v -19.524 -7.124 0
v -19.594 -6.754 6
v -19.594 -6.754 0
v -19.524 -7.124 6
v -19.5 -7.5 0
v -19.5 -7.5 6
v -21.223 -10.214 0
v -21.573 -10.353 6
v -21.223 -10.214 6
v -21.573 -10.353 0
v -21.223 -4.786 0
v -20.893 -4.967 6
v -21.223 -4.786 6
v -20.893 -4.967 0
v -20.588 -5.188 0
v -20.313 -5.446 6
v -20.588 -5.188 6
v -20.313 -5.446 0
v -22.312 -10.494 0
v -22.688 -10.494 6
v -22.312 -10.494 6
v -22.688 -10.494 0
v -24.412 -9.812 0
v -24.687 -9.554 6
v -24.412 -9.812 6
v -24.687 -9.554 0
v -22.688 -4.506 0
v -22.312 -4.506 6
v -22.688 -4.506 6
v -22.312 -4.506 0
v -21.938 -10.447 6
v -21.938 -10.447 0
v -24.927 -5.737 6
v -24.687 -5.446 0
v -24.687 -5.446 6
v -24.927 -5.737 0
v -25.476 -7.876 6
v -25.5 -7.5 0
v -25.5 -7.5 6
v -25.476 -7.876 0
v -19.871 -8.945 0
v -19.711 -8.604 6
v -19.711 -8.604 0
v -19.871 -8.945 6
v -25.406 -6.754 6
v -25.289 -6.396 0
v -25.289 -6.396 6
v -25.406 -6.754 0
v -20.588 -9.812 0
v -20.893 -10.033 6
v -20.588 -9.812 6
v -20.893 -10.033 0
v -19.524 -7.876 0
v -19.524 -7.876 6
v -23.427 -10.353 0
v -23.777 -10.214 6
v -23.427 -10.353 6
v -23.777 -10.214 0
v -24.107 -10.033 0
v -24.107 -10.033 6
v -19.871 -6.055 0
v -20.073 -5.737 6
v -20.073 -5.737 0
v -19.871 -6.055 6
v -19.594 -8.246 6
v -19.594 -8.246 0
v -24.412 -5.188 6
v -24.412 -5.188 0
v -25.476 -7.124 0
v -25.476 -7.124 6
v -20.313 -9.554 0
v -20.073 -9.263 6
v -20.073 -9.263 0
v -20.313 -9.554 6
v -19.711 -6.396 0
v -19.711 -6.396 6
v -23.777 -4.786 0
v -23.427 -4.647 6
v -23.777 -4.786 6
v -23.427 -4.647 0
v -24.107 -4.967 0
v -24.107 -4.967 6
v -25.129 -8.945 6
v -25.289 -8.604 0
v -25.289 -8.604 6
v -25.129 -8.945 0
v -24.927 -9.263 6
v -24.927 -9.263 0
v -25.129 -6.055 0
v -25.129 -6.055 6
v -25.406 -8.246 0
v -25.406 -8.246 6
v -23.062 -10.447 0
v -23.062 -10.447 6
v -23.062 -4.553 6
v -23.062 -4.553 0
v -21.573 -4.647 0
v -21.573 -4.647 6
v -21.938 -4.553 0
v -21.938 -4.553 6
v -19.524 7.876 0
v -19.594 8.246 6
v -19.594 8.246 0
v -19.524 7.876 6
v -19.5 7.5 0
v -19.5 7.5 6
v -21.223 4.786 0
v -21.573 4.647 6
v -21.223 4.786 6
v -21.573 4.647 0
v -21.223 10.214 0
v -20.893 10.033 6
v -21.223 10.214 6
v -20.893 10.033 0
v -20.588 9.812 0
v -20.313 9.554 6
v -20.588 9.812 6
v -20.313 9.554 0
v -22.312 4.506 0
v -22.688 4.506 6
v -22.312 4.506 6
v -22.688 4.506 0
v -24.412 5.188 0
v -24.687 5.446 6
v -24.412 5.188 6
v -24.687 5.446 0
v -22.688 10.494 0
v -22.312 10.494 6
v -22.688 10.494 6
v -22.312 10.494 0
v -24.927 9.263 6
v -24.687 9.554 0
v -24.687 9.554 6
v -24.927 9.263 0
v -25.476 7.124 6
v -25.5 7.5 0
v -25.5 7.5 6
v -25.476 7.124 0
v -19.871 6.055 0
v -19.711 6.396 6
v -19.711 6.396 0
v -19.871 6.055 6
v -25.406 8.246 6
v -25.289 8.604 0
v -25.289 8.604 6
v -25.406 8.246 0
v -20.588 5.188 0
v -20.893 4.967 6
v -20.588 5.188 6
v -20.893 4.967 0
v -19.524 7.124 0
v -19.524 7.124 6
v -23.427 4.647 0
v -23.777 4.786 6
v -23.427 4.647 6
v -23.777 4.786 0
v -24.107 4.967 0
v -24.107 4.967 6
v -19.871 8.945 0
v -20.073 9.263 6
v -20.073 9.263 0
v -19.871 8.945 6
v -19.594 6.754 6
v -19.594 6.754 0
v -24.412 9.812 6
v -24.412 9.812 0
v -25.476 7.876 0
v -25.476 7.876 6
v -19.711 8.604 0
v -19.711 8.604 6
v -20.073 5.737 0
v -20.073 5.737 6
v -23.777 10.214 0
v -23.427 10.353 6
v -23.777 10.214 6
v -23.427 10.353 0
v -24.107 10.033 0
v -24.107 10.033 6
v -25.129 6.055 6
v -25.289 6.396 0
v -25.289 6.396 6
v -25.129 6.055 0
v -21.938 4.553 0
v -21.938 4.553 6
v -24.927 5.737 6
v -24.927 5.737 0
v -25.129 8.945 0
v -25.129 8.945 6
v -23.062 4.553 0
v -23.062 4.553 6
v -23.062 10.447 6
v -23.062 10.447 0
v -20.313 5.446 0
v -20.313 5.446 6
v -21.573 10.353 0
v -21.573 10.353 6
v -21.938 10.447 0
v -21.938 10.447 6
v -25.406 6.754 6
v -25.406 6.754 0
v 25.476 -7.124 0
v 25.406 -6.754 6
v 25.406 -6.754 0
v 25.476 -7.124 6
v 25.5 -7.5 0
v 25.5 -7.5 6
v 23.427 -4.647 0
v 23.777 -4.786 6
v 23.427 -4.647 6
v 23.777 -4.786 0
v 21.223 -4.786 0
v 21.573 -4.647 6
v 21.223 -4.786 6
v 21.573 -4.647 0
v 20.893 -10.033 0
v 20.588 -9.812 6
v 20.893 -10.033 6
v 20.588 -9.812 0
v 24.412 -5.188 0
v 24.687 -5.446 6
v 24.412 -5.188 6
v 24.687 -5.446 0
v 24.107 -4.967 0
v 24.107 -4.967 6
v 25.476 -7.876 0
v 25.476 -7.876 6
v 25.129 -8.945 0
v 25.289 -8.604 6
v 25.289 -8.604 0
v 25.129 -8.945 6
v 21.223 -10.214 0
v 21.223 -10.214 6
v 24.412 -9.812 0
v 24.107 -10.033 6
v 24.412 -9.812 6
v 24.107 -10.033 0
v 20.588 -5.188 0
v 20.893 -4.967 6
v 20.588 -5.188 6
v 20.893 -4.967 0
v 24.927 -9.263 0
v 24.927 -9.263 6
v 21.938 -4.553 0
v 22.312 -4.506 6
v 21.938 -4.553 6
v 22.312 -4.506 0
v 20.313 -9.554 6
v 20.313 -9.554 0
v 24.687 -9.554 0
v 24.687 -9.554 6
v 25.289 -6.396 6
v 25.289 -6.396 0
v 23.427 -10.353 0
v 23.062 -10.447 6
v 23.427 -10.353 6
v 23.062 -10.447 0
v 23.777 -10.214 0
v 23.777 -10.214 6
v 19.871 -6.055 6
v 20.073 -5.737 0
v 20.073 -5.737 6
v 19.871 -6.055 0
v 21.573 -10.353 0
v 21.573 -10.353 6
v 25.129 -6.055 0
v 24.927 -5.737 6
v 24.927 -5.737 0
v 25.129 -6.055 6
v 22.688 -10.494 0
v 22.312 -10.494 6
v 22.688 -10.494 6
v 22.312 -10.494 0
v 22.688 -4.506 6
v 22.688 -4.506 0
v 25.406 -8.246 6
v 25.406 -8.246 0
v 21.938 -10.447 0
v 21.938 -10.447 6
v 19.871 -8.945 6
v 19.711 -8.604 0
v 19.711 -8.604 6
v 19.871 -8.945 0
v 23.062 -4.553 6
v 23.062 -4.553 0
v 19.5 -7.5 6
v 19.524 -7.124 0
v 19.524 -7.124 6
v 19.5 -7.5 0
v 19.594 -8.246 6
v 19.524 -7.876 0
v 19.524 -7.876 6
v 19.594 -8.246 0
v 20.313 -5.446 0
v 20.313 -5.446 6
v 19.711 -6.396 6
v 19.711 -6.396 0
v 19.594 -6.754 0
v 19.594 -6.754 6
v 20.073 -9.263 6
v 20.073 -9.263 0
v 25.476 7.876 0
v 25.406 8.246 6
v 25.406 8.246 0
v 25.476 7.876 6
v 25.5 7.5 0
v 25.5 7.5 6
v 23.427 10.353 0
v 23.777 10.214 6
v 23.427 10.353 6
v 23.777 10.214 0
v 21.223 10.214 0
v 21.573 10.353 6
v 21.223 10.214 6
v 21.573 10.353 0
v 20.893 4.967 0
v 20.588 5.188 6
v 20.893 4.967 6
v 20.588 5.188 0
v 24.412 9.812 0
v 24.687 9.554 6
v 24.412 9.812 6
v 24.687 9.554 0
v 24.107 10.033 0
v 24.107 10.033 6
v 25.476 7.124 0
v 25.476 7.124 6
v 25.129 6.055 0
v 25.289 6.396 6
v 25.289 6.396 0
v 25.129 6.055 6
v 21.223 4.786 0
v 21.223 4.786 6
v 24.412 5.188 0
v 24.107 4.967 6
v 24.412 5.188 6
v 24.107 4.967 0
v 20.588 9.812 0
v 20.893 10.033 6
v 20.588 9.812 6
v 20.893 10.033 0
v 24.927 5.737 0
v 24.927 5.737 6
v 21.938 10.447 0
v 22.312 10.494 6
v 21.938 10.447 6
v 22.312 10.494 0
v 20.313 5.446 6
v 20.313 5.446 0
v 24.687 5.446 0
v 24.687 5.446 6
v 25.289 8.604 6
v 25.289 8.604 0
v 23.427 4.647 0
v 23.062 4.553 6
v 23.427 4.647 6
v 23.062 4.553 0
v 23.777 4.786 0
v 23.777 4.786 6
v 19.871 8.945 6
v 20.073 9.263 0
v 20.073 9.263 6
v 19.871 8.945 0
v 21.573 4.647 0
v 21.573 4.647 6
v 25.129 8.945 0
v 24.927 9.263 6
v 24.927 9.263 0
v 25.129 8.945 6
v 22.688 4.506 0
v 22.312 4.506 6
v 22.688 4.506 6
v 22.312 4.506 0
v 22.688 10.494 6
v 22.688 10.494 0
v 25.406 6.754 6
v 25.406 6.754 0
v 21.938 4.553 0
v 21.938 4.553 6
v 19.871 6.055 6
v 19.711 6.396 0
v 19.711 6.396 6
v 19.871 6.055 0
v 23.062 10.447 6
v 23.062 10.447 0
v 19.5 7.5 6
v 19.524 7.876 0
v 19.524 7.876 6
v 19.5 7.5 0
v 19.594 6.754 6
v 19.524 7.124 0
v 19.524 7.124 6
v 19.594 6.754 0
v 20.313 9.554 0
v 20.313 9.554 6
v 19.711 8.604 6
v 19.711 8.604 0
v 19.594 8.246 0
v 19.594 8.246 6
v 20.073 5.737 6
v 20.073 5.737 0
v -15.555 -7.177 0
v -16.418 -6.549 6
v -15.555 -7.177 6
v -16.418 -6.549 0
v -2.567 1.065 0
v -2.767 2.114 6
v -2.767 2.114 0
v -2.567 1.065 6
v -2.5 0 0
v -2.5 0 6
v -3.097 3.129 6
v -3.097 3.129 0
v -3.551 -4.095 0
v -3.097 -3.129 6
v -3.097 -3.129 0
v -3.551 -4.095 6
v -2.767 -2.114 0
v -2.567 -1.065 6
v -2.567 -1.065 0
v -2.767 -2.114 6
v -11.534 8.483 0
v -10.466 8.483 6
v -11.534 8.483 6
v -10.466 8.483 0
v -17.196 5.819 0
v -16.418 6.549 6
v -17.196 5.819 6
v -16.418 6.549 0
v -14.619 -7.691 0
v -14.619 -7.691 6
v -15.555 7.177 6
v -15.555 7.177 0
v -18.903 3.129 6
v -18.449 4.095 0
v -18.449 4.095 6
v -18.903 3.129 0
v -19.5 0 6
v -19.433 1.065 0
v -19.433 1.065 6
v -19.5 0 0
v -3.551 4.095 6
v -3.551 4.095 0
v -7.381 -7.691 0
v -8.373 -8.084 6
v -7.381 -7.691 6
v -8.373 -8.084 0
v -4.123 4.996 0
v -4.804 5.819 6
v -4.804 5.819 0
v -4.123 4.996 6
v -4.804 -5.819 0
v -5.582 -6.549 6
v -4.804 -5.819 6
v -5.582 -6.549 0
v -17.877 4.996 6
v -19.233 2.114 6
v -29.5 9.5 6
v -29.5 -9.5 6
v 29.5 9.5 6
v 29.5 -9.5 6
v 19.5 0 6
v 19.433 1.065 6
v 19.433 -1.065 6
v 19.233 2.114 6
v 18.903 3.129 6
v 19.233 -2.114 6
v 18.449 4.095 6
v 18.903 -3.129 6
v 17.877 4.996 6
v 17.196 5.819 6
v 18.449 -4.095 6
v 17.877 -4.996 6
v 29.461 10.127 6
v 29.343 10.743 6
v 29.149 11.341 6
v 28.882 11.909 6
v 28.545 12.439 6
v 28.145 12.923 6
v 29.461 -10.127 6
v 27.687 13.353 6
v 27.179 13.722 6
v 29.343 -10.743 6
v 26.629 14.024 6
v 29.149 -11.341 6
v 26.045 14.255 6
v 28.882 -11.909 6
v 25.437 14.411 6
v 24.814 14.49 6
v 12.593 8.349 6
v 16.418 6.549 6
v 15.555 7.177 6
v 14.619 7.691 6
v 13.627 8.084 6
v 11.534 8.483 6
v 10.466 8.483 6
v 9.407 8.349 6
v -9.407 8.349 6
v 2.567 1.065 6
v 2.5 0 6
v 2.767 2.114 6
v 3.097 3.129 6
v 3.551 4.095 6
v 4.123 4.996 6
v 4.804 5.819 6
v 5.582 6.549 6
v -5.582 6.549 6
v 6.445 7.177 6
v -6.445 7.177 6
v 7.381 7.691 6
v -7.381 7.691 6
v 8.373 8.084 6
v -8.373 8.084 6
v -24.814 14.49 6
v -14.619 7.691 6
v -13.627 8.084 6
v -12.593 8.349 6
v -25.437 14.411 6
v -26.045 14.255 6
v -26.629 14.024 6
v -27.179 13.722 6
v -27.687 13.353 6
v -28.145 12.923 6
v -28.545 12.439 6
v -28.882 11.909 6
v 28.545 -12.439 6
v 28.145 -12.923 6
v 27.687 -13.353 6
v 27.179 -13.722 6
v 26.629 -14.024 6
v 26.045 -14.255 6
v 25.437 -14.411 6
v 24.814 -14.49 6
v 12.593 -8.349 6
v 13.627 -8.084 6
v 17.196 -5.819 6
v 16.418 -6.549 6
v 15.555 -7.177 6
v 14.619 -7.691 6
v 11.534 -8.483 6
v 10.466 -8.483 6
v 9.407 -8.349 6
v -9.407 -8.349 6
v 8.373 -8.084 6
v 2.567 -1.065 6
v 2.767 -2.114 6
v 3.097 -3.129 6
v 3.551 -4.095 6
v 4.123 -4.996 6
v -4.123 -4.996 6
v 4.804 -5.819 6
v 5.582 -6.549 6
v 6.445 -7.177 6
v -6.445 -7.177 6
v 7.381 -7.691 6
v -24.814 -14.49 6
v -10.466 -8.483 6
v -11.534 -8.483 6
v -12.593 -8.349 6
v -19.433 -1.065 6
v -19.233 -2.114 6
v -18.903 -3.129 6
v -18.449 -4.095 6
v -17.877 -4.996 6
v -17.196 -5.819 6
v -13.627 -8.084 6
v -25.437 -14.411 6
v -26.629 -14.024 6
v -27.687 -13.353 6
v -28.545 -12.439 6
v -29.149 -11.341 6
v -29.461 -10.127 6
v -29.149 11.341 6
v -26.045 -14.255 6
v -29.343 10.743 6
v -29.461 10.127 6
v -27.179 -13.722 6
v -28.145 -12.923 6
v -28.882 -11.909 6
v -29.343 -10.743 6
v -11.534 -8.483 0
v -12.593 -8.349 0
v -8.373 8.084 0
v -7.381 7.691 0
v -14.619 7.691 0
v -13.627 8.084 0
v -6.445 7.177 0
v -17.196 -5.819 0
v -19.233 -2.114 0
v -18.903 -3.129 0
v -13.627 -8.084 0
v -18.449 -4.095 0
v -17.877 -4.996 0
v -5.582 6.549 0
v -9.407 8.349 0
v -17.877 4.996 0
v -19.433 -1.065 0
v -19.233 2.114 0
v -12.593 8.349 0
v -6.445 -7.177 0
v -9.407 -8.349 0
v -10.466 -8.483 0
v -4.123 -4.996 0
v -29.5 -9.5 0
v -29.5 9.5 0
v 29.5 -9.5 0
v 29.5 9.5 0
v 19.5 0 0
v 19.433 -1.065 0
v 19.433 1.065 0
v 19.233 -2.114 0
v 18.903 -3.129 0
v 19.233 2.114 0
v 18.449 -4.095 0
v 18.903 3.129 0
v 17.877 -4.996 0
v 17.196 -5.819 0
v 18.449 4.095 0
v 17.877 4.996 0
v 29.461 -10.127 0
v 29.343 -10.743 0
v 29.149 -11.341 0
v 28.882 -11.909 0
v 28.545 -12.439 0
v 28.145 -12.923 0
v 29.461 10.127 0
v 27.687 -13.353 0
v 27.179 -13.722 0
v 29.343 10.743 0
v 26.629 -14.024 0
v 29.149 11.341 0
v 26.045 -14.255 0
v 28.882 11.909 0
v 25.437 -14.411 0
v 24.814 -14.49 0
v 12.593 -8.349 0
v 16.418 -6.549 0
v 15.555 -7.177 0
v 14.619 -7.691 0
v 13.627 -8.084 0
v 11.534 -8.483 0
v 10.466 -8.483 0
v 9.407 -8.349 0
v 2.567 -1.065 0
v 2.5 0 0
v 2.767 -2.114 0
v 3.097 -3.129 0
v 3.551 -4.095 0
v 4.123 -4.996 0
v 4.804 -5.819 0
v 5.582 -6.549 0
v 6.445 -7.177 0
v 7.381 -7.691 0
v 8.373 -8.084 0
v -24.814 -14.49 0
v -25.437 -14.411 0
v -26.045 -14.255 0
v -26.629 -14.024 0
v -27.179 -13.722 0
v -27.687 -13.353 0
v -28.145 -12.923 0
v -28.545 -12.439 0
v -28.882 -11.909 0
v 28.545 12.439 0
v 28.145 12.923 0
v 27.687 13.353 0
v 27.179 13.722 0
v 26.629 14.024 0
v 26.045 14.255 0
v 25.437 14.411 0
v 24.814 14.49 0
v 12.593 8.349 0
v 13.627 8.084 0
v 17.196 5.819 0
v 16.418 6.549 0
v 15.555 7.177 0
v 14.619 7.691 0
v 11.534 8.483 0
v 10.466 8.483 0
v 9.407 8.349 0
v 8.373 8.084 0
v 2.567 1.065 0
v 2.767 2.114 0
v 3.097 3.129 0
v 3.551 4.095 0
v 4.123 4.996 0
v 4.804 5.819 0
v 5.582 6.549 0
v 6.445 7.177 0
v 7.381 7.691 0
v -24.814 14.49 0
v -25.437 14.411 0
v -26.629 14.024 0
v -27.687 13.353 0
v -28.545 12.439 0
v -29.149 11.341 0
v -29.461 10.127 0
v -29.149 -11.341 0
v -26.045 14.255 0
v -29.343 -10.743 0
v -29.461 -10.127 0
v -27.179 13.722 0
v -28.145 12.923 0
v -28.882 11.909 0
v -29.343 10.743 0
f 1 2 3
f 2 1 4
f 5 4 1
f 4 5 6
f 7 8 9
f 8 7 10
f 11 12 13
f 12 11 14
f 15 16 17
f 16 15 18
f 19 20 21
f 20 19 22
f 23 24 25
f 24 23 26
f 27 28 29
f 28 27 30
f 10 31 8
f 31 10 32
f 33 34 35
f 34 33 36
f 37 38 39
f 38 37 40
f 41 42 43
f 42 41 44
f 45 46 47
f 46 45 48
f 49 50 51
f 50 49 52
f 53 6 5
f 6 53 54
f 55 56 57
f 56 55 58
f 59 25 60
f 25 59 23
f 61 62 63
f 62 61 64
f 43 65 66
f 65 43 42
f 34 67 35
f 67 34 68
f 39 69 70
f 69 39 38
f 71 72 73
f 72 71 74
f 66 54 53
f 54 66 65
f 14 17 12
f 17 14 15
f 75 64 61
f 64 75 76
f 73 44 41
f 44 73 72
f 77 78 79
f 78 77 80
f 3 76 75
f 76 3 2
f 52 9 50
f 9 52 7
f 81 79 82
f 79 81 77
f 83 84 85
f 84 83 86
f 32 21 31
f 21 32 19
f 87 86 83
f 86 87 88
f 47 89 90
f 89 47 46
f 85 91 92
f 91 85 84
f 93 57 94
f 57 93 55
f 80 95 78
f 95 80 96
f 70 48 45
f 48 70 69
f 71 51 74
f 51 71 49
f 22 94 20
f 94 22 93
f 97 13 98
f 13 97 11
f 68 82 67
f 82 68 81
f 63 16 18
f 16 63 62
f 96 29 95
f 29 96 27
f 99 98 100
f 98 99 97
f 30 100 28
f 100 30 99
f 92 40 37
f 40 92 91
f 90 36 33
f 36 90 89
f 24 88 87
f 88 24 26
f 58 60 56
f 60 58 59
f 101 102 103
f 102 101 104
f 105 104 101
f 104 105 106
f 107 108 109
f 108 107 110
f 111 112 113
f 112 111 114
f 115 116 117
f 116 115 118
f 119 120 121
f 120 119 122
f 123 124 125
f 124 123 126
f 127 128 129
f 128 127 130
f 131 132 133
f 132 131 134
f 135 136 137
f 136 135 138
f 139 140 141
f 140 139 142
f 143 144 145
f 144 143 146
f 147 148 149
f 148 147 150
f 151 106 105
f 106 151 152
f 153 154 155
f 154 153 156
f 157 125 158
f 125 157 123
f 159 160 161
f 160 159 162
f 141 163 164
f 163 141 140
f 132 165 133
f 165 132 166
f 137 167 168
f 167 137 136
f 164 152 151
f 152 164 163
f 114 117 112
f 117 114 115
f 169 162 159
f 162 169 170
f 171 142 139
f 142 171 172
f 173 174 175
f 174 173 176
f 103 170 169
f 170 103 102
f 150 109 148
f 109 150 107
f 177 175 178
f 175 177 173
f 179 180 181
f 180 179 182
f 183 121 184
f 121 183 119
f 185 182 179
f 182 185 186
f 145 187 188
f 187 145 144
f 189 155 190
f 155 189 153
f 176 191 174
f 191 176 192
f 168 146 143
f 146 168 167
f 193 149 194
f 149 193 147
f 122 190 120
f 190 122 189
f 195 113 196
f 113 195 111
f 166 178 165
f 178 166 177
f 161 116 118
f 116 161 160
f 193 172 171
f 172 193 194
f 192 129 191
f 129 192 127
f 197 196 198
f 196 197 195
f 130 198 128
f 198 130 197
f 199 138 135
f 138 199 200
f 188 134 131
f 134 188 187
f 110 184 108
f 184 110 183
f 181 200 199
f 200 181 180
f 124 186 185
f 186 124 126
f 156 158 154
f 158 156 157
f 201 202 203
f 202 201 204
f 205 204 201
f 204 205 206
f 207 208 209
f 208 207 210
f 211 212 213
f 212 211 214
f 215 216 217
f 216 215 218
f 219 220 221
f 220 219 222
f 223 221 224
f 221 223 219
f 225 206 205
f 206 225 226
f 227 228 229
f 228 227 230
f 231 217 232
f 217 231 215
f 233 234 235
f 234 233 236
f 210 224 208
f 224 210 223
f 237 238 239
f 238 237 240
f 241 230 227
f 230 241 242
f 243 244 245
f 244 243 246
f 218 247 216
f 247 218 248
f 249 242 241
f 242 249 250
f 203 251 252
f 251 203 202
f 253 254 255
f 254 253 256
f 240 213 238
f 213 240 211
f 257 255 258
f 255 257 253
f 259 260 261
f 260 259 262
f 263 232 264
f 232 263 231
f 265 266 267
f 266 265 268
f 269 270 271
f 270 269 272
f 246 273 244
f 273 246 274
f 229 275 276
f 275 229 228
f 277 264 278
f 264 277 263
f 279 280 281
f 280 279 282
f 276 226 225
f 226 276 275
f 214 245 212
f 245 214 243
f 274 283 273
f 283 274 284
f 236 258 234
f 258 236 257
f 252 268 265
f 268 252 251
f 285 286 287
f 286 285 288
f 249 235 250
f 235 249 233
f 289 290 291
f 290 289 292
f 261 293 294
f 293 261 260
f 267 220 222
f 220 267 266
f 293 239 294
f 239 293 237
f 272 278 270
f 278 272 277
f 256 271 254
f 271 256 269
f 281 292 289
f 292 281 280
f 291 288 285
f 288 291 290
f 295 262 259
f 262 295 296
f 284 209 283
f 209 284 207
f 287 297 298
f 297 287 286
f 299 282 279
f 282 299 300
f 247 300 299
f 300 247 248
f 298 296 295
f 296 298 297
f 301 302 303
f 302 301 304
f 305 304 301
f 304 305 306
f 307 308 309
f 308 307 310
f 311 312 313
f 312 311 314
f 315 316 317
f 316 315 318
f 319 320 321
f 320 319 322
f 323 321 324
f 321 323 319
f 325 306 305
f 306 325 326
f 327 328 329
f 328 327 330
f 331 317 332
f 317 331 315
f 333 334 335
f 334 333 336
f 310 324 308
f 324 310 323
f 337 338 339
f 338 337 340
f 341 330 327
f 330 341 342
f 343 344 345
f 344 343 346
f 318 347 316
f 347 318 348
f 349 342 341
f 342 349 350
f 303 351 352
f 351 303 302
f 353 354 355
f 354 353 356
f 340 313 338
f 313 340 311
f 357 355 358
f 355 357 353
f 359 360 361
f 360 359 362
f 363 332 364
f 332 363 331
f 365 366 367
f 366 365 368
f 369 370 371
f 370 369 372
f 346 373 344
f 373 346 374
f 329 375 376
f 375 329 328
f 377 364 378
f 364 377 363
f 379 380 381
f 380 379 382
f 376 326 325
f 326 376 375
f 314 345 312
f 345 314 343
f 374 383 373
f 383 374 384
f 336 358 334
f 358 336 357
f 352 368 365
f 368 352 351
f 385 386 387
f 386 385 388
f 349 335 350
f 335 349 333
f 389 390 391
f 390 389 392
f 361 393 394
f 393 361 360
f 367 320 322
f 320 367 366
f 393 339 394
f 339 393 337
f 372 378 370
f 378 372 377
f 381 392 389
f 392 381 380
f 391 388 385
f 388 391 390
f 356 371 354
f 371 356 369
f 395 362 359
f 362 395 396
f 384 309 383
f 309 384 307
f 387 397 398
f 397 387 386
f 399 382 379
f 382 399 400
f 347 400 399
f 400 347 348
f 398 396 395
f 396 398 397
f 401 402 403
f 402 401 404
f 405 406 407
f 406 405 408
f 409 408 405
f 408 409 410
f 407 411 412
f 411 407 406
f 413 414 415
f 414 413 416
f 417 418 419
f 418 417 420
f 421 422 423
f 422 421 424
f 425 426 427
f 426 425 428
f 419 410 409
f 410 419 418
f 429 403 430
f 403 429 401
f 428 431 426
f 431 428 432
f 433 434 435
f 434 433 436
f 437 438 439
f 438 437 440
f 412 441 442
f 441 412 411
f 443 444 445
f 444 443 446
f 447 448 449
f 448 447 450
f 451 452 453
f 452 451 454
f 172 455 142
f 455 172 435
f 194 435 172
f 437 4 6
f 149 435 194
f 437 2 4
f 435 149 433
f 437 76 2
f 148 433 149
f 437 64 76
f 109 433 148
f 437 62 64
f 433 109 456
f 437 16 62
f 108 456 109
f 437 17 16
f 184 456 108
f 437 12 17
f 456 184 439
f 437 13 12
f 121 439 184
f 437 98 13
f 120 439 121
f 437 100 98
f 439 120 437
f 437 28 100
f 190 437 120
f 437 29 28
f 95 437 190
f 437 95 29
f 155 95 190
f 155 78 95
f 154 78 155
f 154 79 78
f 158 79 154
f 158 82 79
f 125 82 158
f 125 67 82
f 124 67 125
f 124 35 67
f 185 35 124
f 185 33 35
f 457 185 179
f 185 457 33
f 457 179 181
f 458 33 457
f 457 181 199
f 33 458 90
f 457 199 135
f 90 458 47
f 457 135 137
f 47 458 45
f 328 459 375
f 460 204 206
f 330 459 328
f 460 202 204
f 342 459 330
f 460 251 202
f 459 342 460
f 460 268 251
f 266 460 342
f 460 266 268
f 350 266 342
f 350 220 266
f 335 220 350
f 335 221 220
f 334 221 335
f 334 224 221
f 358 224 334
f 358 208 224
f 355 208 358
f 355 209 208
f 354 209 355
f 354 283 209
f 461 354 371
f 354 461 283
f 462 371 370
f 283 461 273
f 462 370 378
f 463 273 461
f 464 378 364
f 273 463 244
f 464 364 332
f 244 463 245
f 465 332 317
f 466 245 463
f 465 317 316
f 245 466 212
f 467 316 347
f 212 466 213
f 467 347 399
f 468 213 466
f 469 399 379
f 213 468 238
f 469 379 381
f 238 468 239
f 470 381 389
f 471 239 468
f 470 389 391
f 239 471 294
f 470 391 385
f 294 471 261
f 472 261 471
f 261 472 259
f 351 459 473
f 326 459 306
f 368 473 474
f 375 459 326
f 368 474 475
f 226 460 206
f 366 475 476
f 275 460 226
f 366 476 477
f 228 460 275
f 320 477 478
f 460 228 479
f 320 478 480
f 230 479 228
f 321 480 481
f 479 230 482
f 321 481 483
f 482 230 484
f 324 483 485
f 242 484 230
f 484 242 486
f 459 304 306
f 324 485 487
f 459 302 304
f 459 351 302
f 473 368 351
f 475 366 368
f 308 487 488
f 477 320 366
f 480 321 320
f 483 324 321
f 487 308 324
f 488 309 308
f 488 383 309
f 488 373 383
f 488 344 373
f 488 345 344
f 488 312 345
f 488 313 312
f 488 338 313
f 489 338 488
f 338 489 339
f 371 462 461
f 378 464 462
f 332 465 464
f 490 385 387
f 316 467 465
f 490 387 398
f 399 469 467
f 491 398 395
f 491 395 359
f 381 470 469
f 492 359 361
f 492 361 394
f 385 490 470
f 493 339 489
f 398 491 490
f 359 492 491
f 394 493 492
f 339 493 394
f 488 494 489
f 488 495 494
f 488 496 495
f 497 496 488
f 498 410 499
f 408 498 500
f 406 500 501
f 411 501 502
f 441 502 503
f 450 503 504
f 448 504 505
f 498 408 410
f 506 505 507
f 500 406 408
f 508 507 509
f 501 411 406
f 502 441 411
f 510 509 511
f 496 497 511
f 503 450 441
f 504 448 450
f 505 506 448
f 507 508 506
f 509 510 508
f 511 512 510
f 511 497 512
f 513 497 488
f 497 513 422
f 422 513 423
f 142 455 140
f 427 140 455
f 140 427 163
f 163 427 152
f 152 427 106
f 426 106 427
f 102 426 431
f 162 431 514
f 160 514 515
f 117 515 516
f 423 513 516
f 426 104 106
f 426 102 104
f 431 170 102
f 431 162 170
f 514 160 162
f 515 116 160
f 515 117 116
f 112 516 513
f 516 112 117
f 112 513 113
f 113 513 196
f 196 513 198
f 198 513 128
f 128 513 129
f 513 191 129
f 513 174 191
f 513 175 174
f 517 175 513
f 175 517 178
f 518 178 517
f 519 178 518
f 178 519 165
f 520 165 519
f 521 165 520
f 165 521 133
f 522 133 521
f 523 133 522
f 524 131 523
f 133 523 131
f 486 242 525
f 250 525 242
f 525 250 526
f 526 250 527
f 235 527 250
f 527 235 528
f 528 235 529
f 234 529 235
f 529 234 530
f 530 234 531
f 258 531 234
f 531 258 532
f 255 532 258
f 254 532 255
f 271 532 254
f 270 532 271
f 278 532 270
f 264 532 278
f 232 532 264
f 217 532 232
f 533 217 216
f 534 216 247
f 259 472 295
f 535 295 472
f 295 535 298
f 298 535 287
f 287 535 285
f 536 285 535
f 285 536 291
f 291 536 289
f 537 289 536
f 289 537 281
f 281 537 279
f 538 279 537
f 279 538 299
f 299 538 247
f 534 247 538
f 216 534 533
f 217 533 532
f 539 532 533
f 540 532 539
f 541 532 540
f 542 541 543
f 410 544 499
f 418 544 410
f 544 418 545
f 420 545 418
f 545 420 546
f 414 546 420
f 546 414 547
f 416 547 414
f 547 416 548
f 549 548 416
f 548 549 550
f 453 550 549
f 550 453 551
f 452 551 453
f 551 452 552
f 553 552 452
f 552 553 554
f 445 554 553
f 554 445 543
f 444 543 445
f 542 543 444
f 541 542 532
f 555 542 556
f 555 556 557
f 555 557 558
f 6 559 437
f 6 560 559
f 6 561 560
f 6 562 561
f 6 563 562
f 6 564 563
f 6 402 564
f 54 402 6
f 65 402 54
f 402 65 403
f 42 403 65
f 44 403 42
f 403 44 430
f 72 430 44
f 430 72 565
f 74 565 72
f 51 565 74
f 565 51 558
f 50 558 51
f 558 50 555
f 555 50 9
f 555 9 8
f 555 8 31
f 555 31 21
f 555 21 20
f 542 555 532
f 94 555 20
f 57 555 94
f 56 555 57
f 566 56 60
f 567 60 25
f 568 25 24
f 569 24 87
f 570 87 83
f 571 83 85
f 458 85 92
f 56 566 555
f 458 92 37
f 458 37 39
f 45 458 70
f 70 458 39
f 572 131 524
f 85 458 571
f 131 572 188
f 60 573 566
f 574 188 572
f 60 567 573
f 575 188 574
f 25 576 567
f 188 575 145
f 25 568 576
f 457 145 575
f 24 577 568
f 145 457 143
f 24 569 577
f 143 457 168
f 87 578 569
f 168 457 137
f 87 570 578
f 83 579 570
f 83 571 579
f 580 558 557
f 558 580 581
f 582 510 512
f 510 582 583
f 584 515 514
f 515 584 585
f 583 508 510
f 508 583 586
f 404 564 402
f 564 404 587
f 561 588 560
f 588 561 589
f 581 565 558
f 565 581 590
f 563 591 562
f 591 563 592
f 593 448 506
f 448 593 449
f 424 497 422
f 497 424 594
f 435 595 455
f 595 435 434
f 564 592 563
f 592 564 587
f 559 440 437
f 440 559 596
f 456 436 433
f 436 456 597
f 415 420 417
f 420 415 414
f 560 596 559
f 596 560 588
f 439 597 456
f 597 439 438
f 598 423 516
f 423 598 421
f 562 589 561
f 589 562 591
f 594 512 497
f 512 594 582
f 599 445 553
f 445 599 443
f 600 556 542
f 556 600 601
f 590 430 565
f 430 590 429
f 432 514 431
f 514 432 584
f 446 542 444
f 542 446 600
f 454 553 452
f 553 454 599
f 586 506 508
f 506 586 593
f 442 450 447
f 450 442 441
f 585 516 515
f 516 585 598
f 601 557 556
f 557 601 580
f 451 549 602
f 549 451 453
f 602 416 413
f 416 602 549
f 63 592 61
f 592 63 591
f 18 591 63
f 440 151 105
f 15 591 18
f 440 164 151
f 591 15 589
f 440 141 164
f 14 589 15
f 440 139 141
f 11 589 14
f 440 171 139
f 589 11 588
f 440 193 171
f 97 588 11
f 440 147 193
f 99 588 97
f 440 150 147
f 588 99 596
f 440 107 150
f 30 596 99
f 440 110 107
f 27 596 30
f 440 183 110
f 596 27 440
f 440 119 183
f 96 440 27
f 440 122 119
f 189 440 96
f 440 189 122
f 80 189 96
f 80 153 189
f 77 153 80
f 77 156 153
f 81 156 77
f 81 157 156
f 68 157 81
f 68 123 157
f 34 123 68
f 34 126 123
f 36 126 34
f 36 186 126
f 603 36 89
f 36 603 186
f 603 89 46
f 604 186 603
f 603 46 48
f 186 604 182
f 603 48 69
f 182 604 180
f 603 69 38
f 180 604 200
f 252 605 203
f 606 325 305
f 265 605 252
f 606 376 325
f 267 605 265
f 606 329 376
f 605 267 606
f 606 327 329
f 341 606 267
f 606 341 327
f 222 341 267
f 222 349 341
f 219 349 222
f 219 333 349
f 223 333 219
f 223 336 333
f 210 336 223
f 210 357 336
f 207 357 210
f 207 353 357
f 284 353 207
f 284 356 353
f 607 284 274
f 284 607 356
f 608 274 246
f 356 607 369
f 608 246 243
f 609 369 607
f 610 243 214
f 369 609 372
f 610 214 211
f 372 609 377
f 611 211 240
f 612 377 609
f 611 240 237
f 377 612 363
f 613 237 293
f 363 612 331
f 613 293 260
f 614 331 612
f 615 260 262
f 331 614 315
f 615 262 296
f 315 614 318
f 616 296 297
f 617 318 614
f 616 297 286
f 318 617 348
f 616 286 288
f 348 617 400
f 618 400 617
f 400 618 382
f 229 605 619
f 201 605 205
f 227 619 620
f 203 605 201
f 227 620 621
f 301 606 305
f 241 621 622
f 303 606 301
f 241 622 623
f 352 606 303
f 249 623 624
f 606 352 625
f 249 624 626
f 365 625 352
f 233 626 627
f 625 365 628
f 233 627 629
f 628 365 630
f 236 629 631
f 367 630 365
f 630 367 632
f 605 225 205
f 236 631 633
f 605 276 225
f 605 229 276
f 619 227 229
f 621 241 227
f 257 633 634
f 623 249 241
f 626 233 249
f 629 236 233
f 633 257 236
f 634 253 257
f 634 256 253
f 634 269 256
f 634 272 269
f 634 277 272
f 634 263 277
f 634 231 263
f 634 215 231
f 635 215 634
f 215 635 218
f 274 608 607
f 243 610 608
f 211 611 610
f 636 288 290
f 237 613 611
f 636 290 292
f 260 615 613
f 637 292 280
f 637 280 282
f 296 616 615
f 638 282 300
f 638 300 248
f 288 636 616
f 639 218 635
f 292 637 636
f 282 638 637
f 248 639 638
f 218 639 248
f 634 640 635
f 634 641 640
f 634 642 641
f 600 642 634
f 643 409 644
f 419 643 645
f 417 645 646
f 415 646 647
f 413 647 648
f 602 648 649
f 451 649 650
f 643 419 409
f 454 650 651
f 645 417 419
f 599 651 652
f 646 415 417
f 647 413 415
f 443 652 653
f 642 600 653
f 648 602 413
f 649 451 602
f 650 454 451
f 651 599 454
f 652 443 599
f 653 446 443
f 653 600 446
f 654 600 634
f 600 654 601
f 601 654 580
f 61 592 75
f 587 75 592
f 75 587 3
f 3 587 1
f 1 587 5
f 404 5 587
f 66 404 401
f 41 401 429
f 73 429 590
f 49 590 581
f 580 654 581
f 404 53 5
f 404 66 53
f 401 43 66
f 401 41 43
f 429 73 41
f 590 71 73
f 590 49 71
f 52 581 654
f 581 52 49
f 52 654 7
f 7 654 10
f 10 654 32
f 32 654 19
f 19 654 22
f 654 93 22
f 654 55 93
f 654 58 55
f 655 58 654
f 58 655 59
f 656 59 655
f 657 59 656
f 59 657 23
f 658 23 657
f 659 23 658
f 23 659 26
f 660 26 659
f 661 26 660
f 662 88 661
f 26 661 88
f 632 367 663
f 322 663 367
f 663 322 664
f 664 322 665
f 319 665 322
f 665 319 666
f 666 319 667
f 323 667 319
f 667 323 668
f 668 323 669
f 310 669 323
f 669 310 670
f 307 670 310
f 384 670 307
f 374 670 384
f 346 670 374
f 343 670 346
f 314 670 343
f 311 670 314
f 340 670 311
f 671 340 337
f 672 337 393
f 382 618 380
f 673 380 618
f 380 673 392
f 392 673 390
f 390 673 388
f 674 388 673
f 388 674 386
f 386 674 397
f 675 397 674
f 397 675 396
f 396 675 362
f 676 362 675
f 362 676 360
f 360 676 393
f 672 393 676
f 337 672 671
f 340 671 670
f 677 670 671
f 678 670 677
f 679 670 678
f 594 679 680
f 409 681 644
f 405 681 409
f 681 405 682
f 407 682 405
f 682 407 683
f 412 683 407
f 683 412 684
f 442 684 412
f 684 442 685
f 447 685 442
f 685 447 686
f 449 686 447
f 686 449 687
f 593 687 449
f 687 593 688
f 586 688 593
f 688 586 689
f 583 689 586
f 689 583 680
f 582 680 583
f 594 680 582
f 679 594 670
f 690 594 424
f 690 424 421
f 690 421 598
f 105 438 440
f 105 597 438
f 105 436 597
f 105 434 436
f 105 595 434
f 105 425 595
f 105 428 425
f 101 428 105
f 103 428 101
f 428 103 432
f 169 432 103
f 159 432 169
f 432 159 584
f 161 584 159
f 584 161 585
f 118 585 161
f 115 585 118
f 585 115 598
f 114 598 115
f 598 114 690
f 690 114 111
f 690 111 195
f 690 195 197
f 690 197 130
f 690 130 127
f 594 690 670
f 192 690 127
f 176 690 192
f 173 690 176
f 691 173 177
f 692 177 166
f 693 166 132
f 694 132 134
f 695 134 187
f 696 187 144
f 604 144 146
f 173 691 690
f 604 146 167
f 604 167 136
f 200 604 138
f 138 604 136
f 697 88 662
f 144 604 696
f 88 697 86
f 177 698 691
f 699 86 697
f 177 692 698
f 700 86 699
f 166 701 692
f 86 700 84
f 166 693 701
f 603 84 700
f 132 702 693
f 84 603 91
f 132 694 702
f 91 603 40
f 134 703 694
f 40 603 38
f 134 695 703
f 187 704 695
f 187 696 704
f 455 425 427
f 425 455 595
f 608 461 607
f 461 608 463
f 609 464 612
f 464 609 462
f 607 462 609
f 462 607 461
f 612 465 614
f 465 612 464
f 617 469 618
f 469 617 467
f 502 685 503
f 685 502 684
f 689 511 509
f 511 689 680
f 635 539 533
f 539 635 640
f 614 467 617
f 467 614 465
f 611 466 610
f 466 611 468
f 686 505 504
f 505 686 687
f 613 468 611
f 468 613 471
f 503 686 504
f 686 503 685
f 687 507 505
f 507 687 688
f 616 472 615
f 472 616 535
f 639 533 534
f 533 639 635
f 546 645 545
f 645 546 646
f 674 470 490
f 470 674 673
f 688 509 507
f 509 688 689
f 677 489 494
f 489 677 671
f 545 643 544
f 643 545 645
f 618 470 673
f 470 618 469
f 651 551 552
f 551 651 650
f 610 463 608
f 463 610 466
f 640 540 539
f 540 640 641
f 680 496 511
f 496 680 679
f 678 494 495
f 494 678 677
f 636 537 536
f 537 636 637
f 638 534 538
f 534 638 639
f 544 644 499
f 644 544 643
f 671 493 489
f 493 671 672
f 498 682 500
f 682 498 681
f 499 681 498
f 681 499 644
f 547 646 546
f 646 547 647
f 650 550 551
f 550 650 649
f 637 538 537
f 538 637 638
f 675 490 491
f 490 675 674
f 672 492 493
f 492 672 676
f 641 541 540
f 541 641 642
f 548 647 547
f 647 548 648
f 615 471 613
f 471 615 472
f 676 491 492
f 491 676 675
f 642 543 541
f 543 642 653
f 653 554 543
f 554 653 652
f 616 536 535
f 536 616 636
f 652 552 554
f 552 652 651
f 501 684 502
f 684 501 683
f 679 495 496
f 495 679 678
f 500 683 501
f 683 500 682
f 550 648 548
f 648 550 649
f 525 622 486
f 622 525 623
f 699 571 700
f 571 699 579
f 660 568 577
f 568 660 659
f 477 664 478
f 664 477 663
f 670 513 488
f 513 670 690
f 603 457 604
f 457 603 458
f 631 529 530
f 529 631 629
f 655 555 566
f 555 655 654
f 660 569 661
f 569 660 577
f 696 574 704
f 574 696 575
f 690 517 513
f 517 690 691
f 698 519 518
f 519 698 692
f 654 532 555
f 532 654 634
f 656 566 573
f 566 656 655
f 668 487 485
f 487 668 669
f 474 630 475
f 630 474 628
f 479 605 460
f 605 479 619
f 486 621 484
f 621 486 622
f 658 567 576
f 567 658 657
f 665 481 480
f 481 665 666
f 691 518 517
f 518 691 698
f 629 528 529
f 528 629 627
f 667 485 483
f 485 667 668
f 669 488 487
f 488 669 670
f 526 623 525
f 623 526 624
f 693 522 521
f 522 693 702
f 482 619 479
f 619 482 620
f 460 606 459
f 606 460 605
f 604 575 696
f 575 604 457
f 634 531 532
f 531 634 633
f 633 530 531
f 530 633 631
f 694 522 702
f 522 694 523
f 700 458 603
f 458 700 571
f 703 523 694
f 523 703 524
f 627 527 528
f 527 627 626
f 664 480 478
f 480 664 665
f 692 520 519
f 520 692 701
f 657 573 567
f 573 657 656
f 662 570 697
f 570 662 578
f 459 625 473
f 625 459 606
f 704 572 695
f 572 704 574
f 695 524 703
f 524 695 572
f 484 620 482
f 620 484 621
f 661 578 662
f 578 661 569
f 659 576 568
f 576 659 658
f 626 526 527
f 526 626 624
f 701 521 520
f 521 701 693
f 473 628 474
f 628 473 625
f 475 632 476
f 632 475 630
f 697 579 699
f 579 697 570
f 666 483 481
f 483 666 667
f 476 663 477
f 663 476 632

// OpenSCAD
$fn = 50;


difference() {
	union() {
		hull() {
			translate(v = [-24.5000000000, 9.5000000000, 0]) {
				cylinder(h = 6, r = 5);
			}
			translate(v = [24.5000000000, 9.5000000000, 0]) {
				cylinder(h = 6, r = 5);
			}
			translate(v = [-24.5000000000, -9.5000000000, 0]) {
				cylinder(h = 6, r = 5);
			}
			translate(v = [24.5000000000, -9.5000000000, 0]) {
				cylinder(h = 6, r = 5);
			}
		}
	}
	union() {
		#translate(v = [-22.5000000000, -7.5000000000, -100.0000000000]) {
			cylinder(h = 200, r = 3.0000000000);
		}
		#translate(v = [-22.5000000000, 7.5000000000, -100.0000000000]) {
			cylinder(h = 200, r = 3.0000000000);
		}
		#translate(v = [22.5000000000, -7.5000000000, -100.0000000000]) {
			cylinder(h = 200, r = 3.0000000000);
		}
		#translate(v = [22.5000000000, 7.5000000000, -100.0000000000]) {
			cylinder(h = 200, r = 3.0000000000);
		}
		#translate(v = [-11.0000000000, 0, 0]) {
			cylinder(h = 6, r = 8.5000000000);
		}
		#translate(v = [11.0000000000, 0, 0]) {
			cylinder(h = 6, r = 8.5000000000);
		}
	}
}
